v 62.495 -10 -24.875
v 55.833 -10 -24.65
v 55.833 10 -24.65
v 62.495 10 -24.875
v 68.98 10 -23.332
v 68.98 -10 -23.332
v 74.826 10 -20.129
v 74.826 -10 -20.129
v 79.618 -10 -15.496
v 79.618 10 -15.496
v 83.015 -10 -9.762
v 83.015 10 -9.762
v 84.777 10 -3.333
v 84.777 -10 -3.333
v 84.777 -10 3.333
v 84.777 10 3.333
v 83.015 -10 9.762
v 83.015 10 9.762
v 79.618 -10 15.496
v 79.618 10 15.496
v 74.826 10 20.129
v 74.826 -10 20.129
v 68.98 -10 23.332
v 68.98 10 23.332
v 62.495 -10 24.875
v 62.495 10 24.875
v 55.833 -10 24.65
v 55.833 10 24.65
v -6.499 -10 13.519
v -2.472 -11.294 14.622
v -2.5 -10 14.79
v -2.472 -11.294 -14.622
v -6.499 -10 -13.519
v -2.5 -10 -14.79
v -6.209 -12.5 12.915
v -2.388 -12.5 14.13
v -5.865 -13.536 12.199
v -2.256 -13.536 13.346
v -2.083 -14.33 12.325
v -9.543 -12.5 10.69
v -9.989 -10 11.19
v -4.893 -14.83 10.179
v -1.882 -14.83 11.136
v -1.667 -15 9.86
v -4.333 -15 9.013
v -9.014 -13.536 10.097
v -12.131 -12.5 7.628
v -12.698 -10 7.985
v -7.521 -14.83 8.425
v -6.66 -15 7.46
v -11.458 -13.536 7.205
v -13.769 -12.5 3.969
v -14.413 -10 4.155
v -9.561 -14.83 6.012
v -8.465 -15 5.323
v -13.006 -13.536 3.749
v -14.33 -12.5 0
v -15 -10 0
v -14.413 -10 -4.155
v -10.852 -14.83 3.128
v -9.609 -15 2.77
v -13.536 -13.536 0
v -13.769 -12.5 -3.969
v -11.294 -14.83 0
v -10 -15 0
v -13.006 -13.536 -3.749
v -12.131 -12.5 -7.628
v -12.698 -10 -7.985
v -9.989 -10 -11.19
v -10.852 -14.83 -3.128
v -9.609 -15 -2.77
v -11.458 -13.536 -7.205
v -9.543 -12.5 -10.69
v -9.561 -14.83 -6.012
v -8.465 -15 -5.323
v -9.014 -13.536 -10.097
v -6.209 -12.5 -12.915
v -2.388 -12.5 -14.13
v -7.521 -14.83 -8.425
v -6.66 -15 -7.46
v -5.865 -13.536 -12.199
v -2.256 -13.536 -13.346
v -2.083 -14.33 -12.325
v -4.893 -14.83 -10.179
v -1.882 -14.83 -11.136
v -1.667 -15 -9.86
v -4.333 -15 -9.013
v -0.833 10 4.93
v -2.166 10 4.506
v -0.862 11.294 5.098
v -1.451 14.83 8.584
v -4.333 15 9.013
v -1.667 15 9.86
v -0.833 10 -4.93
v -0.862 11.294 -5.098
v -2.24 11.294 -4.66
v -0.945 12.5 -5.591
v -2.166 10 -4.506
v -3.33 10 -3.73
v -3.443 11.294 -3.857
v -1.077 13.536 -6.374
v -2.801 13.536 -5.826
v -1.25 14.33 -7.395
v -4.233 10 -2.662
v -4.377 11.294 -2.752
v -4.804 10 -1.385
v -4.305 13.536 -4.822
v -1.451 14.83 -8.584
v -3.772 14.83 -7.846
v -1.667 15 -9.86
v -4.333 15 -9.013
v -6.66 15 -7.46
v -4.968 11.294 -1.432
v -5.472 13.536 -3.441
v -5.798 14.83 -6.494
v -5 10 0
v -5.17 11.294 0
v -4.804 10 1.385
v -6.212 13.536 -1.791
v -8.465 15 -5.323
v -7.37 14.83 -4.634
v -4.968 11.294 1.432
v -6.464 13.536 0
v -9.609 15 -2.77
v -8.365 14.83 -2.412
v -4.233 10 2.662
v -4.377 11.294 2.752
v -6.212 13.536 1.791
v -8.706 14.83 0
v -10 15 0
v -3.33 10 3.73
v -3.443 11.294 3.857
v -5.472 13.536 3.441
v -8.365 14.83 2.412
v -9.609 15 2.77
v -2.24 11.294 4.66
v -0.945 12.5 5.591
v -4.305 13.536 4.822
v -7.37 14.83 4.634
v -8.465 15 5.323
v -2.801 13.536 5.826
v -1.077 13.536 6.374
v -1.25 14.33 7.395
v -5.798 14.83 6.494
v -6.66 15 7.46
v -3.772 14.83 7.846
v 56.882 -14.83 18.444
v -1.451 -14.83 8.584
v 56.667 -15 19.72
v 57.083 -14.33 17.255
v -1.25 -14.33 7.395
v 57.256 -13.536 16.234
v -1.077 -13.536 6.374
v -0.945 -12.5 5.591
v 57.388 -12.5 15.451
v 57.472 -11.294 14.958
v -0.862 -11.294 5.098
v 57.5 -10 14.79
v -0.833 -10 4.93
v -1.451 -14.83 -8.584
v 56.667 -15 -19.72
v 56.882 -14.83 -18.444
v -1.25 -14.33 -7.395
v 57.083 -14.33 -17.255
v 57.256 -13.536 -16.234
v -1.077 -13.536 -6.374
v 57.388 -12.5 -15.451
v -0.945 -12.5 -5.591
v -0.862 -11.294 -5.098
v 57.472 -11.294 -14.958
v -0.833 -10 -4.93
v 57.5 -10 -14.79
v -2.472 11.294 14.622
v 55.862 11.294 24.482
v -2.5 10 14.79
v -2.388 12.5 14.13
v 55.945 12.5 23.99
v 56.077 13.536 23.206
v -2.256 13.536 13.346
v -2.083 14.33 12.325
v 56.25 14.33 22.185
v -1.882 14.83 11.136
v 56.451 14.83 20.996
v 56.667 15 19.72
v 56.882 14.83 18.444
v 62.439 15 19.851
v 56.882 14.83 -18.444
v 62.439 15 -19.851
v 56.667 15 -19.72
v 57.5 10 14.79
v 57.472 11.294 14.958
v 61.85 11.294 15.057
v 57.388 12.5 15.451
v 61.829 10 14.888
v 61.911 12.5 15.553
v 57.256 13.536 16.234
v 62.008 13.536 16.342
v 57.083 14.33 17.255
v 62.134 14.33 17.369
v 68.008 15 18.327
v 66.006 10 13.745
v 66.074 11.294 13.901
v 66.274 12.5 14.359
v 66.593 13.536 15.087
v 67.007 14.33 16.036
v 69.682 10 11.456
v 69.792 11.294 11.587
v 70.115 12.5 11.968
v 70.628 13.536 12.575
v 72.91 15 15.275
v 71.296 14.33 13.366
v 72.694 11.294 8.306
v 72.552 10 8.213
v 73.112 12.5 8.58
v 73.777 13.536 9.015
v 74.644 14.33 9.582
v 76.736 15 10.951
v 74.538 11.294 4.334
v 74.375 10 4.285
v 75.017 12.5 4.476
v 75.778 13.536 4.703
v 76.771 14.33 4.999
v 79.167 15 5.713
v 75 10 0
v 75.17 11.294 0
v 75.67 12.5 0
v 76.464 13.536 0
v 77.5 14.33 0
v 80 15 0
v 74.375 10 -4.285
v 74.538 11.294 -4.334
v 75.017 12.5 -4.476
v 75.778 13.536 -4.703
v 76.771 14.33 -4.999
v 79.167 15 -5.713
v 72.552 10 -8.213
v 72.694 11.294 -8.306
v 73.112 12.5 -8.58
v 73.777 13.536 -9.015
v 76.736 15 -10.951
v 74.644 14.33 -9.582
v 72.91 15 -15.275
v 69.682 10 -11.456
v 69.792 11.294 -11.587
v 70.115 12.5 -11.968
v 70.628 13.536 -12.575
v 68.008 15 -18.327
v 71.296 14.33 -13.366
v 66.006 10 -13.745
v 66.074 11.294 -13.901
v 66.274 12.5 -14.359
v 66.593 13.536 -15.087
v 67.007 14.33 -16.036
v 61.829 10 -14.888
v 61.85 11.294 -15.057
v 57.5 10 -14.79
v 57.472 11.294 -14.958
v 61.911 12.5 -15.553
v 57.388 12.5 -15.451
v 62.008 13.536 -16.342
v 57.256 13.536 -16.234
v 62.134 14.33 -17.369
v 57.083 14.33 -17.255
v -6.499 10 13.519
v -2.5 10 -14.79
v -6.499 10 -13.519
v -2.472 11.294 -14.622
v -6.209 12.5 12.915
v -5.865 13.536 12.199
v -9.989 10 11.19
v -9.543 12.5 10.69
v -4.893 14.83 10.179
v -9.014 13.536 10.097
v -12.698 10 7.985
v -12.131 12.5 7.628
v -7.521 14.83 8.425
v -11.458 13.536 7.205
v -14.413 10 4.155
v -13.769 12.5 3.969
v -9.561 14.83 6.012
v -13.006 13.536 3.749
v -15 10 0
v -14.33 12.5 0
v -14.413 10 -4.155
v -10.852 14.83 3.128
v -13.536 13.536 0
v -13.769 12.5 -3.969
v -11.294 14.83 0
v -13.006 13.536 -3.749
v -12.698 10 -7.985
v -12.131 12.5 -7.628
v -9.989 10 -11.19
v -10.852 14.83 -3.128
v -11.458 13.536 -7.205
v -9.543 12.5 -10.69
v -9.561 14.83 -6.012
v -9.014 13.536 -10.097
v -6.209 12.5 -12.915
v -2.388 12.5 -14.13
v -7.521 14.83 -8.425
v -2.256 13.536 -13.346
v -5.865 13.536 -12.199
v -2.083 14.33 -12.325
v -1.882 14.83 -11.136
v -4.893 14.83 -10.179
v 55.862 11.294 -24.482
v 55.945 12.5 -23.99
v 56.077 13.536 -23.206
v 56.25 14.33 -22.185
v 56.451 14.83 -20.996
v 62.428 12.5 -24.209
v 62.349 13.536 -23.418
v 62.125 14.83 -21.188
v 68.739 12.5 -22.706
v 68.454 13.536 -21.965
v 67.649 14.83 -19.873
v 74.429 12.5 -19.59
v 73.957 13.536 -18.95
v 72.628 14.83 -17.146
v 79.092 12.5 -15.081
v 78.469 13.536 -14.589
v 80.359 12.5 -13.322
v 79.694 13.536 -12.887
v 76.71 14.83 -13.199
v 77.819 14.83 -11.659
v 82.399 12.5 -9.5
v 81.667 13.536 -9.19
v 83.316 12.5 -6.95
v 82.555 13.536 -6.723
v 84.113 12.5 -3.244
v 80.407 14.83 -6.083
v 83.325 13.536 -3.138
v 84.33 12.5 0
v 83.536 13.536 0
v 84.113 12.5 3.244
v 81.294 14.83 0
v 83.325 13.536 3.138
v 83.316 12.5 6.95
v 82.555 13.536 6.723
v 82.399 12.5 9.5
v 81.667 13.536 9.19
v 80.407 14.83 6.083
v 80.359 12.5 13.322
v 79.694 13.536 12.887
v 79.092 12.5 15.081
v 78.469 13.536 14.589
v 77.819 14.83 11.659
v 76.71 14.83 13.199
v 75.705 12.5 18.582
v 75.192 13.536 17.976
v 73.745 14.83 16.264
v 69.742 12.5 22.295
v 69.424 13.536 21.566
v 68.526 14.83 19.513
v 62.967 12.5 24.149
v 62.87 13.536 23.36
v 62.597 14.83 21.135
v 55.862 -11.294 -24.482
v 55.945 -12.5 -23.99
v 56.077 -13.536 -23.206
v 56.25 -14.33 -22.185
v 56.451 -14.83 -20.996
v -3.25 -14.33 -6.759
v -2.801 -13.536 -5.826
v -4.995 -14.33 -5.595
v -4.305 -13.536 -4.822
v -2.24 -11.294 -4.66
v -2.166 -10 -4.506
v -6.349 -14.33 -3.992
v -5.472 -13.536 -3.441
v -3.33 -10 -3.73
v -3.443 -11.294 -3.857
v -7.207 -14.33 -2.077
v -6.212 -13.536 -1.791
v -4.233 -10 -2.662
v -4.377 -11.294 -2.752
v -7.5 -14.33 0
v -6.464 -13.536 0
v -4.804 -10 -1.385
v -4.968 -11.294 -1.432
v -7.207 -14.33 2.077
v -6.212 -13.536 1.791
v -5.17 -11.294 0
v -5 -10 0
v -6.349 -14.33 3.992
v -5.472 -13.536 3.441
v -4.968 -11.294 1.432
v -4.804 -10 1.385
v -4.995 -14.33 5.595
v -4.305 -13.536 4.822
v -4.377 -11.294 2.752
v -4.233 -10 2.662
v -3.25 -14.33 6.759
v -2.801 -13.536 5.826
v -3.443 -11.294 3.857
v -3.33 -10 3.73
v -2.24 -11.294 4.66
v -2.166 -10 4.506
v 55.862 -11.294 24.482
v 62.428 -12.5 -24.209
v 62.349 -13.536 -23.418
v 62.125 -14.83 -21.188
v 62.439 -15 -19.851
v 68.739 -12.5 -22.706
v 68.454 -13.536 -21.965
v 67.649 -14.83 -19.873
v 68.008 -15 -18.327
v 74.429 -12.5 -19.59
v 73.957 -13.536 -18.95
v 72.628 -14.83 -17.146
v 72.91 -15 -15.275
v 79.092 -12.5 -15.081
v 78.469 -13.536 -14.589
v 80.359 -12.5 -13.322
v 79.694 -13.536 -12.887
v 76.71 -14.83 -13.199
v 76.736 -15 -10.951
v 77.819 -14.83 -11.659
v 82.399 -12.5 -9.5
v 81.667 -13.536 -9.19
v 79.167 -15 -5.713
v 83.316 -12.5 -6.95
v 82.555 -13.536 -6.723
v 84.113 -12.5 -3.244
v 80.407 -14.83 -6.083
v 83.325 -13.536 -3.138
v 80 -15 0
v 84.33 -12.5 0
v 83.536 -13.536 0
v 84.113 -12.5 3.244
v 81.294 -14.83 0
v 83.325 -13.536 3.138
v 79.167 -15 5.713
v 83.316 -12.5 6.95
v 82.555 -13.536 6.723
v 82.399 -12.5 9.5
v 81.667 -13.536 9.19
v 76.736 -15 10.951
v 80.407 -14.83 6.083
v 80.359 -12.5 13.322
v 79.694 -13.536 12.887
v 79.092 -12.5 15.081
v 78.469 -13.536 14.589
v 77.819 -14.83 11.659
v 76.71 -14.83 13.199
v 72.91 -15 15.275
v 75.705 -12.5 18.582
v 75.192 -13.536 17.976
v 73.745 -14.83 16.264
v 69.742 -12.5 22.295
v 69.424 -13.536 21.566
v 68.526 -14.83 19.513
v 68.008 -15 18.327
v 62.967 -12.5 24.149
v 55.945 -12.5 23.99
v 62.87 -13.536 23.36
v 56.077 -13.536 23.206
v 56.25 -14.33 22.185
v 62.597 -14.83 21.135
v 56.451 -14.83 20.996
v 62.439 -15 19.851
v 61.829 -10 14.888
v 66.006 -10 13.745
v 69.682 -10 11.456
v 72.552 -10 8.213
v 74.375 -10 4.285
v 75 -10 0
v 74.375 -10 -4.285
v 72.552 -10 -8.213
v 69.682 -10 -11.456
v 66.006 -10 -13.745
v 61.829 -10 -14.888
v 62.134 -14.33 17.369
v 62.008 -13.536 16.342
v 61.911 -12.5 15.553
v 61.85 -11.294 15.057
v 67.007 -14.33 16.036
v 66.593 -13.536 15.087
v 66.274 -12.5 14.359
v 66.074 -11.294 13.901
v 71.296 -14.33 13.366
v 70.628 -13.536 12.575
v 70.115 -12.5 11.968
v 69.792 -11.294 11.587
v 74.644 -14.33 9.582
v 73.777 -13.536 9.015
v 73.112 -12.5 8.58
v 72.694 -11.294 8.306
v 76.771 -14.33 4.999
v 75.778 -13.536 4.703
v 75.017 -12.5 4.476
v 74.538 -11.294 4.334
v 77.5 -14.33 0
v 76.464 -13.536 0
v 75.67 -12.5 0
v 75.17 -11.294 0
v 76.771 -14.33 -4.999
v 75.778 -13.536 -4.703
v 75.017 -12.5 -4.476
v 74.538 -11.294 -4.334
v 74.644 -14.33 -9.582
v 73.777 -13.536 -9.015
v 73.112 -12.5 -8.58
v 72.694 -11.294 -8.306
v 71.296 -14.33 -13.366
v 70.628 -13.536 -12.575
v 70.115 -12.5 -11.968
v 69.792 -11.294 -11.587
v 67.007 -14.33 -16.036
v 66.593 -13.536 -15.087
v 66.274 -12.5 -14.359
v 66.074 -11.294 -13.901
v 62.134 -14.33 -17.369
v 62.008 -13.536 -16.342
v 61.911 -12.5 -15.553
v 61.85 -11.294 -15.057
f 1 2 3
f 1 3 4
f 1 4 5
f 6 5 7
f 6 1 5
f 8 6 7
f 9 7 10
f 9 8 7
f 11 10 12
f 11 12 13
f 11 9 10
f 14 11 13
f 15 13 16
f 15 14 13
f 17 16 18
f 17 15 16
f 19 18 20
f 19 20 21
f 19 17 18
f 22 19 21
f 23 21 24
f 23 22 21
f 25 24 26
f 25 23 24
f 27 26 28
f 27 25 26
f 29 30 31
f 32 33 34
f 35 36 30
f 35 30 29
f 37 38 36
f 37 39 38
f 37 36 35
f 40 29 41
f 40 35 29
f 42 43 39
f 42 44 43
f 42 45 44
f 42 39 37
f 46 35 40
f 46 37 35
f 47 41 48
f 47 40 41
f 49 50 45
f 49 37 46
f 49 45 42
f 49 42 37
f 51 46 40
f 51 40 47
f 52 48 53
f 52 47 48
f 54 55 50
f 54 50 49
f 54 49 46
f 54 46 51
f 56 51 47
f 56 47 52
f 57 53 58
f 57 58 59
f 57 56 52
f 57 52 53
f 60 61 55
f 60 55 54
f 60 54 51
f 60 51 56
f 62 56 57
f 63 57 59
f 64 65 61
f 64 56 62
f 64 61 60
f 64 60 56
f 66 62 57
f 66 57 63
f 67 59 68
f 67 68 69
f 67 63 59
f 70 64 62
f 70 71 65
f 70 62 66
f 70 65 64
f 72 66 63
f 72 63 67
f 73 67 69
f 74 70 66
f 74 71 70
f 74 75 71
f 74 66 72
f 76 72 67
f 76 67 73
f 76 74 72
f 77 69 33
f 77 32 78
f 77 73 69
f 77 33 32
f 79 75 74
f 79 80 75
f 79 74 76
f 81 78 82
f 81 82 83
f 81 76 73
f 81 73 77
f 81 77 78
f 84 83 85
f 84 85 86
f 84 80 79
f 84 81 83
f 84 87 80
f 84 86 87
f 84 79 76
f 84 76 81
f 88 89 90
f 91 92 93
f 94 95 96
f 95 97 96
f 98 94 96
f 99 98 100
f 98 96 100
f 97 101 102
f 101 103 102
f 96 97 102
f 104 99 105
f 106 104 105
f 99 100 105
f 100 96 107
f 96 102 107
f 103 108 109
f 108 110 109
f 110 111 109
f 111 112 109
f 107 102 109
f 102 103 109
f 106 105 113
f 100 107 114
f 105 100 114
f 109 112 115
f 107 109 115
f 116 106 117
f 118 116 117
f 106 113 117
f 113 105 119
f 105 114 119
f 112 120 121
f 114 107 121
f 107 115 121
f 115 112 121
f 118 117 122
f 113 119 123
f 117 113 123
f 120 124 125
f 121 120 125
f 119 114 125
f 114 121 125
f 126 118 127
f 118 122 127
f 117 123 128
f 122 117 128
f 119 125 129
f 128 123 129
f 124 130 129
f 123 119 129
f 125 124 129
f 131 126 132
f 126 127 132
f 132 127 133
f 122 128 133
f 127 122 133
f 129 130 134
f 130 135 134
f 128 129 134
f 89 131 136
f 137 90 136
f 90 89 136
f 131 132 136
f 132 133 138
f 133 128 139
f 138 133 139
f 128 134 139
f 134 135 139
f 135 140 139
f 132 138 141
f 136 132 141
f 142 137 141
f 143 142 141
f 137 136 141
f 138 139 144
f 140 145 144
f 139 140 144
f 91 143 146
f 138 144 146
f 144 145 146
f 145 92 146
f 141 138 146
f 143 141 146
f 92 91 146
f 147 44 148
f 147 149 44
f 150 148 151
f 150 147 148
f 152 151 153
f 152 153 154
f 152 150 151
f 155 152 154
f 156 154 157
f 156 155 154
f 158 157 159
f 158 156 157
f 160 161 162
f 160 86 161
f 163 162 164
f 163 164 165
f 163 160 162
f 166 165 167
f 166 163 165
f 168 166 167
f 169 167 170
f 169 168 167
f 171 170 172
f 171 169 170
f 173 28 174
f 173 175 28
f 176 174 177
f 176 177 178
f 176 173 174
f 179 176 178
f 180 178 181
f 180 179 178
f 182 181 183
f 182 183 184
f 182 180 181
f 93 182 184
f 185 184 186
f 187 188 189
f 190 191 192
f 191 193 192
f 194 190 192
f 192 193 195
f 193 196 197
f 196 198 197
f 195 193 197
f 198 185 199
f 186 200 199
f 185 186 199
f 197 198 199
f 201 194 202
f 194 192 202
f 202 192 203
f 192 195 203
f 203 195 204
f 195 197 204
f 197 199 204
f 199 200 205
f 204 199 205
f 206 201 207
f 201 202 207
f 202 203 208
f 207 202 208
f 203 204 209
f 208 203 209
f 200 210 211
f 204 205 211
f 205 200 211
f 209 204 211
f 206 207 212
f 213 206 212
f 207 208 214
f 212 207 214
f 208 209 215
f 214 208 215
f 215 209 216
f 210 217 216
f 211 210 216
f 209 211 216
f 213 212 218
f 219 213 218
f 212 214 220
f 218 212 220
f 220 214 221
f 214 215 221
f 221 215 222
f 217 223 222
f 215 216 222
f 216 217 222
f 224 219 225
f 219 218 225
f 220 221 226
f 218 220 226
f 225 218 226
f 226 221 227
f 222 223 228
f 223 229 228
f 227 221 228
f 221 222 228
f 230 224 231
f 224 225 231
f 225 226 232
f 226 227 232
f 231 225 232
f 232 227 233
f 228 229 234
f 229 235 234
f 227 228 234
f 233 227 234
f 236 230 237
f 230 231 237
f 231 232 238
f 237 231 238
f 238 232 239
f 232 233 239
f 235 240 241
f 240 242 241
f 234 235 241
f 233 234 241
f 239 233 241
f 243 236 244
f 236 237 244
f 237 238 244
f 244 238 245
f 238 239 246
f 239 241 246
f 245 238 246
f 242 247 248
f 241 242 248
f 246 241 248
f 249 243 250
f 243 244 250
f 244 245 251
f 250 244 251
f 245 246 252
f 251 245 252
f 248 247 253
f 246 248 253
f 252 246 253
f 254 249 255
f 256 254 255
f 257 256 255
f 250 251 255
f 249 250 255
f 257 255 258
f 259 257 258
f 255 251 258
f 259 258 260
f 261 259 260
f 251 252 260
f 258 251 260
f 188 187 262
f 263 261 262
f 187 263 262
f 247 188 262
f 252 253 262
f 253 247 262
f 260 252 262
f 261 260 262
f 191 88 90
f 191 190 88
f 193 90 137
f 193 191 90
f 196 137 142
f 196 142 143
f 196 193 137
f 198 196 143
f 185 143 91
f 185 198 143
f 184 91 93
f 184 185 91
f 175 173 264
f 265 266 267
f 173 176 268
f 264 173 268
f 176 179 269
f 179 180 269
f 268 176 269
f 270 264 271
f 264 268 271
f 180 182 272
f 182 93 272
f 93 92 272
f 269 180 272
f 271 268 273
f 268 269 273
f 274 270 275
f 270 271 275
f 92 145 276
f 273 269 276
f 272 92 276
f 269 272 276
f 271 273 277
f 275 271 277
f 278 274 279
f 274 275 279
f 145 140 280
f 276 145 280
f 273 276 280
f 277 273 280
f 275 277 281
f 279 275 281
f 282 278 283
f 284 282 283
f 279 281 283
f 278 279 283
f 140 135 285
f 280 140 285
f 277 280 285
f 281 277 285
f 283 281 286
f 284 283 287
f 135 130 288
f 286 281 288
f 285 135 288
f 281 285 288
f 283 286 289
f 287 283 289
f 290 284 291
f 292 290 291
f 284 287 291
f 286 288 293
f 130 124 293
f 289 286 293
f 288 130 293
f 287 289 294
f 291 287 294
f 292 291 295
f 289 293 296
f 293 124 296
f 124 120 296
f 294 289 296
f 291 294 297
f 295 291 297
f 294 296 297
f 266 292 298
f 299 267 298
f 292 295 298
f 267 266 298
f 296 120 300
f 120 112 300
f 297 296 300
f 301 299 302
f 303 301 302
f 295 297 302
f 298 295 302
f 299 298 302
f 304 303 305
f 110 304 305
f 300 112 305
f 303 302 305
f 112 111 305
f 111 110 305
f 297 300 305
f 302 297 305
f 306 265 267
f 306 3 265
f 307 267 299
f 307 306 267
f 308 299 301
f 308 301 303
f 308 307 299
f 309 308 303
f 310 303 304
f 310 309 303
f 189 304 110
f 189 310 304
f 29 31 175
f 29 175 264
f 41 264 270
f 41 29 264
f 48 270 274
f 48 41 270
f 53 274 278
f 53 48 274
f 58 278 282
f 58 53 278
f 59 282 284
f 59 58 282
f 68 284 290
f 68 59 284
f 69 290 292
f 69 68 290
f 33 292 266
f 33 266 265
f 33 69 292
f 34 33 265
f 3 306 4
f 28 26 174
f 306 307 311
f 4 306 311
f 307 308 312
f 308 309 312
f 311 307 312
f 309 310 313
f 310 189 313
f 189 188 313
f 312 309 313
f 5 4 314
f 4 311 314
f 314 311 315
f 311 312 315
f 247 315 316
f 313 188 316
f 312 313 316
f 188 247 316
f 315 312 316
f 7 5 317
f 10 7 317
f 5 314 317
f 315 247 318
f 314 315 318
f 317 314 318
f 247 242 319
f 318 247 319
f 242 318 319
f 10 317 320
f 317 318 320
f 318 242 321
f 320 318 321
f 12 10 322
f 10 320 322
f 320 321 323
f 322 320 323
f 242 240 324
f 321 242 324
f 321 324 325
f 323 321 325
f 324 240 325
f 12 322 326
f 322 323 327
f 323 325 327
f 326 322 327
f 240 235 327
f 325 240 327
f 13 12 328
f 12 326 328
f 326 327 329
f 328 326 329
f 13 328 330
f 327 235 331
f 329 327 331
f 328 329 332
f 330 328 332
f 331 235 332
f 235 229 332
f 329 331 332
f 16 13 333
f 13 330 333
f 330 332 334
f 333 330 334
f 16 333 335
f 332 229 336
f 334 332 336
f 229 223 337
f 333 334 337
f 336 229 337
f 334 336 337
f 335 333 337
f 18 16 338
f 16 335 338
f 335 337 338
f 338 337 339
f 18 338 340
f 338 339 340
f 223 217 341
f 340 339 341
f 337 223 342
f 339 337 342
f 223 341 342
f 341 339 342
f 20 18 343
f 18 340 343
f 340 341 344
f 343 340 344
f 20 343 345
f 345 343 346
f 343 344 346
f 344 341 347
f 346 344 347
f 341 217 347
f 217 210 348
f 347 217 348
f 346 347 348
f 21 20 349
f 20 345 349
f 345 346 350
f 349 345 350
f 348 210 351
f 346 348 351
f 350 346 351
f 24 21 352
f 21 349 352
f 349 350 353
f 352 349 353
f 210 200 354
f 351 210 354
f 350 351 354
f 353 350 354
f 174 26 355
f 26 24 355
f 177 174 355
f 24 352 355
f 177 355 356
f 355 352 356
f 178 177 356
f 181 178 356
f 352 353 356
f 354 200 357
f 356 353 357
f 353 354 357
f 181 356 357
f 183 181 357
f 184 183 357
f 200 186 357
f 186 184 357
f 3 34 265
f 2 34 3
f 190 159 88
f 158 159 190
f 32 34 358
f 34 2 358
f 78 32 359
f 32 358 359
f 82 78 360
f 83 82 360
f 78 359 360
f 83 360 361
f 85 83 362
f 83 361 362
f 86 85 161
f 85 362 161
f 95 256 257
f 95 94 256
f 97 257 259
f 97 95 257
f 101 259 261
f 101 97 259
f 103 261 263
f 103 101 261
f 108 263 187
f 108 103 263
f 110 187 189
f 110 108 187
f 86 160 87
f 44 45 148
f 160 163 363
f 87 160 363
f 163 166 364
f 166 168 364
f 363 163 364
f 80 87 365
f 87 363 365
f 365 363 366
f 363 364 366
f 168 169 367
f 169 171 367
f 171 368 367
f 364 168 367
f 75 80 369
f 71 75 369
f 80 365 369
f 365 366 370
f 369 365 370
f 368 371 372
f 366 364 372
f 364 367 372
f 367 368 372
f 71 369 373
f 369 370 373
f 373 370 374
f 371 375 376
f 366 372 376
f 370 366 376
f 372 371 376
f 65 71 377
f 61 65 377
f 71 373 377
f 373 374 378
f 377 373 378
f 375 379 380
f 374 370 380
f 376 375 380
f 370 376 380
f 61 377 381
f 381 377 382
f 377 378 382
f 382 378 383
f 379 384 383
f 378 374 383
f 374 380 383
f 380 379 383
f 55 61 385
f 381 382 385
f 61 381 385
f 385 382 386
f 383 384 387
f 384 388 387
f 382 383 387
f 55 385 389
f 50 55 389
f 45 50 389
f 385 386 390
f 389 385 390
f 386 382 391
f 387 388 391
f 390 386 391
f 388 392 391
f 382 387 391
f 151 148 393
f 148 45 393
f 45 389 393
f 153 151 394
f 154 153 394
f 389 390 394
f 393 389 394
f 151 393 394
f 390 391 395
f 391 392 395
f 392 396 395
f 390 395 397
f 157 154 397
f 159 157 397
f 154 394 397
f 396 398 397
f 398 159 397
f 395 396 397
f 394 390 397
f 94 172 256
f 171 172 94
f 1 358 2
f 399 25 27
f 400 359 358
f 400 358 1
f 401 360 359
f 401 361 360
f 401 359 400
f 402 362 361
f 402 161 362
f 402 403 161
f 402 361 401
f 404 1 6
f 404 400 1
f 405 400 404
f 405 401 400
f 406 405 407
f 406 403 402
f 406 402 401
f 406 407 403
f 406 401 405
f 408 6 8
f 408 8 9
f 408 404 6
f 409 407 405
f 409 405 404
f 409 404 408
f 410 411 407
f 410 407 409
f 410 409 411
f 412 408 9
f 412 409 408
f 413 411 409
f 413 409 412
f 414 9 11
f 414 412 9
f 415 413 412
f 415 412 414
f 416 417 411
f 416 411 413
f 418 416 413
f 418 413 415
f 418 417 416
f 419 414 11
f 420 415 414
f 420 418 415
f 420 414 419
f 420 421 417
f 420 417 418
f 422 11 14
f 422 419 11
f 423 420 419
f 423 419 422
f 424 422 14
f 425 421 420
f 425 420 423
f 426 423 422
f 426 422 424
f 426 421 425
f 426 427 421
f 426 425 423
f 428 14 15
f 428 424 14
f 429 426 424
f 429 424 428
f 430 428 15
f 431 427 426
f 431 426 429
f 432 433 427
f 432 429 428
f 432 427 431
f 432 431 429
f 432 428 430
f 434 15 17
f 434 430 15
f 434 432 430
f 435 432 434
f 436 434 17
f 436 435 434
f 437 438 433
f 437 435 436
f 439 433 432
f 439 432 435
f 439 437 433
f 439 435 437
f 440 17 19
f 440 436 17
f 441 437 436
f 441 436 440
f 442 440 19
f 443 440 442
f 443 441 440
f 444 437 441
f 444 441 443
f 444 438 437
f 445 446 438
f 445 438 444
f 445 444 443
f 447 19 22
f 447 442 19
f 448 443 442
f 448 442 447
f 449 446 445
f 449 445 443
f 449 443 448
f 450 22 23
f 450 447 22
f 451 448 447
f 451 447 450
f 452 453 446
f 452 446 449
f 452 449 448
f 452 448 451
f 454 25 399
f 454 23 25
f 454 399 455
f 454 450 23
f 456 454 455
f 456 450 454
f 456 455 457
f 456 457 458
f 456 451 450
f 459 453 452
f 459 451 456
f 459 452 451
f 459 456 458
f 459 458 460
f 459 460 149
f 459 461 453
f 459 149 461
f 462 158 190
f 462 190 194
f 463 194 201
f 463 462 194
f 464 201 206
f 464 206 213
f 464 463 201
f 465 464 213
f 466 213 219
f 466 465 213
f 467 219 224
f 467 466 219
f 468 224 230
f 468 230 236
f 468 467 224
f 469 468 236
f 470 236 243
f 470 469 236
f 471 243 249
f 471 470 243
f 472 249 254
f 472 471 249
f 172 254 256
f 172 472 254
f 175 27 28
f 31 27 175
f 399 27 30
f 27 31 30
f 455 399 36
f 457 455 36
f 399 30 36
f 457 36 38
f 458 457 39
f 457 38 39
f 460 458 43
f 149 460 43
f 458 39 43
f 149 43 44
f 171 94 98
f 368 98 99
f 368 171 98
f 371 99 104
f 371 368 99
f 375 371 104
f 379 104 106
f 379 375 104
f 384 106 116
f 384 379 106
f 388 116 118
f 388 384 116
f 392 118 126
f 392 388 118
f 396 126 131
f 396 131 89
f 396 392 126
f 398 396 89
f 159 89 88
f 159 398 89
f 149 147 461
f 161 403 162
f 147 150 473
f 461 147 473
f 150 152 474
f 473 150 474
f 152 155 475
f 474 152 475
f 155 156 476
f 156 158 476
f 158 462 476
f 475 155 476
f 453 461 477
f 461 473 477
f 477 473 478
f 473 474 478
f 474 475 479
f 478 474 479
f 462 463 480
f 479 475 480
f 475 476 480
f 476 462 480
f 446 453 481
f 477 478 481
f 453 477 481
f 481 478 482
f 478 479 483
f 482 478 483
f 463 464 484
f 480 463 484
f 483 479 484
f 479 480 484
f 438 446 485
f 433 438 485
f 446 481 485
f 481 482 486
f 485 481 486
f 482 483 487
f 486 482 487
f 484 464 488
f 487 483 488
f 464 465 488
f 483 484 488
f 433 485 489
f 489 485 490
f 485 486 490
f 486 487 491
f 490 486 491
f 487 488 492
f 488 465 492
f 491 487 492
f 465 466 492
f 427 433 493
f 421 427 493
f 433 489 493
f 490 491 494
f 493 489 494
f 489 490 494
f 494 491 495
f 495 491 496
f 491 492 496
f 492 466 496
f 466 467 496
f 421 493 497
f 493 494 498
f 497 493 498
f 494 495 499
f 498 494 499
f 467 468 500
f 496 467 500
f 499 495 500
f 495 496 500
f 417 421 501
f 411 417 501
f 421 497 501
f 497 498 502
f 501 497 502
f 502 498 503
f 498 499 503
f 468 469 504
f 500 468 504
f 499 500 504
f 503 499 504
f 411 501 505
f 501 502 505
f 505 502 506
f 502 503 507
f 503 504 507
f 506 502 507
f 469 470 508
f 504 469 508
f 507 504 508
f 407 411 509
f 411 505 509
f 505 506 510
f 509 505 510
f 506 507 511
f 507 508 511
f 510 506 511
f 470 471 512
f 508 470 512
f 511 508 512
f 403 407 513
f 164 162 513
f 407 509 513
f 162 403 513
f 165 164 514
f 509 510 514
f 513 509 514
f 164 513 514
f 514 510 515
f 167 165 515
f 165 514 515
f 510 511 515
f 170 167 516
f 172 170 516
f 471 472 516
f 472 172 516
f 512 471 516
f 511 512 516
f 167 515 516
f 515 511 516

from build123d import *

# Parameters (mm, degrees)
F1_DEPTH      = 15
F1_DEPTH_BACK = 15
F2_R          = 4.99999


# Not quite as in the source:
# - a fillet or chamfer is up to 0.001 mm smaller than in the source, because OpenCascade refuses the exact size


with BuildPart() as f1:
    # F0 (on Front) → F1 (new body, two sides)
    with BuildSketch(Plane.XZ) as f1_sk:
        with BuildLine():
            Line((-2.5, -14.7901994577), (55.8333333333, -24.6503324296))
            ThreePointArc((55.8333333333, -24.6503324296), (85, 0), (55.8333333333, 24.6503324296))
            Line((55.8333333333, 24.6503324296), (-2.5, 14.7901994577))
            ThreePointArc((-2.5, 14.7901994577), (-15, 0), (-2.5, -14.7901994577))
        make_face()
        with BuildLine():
            ThreePointArc((-0.8333333333, -4.9300664859), (-5, 0), (-0.8333333333, 4.9300664859))
            Line((-0.8333333333, 4.9300664859), (57.5, 14.7901994577))
            ThreePointArc((57.5, 14.7901994577), (75, 0), (57.5, -14.7901994577))
            Line((57.5, -14.7901994577), (-0.8333333333, -4.9300664859))
        make_face(mode=Mode.SUBTRACT)
    extrude(amount=F1_DEPTH)
    extrude(f1_sk.sketch, amount=-F1_DEPTH_BACK)

    # F2 (radius 5 in the source; OpenCascade refuses exactly that, so slightly less here)
    f2_edges = [f1.edges().sort_by_distance(p)[0] for p in [
        (28.333333, -15, 9.860133),
        (26.666667, -15, 19.720266),
        (26.666667, 15, 19.720266),
        (28.333333, 15, 9.860133),
    ]]
    fillet(f2_edges, radius=F2_R)


solid = f1.part
